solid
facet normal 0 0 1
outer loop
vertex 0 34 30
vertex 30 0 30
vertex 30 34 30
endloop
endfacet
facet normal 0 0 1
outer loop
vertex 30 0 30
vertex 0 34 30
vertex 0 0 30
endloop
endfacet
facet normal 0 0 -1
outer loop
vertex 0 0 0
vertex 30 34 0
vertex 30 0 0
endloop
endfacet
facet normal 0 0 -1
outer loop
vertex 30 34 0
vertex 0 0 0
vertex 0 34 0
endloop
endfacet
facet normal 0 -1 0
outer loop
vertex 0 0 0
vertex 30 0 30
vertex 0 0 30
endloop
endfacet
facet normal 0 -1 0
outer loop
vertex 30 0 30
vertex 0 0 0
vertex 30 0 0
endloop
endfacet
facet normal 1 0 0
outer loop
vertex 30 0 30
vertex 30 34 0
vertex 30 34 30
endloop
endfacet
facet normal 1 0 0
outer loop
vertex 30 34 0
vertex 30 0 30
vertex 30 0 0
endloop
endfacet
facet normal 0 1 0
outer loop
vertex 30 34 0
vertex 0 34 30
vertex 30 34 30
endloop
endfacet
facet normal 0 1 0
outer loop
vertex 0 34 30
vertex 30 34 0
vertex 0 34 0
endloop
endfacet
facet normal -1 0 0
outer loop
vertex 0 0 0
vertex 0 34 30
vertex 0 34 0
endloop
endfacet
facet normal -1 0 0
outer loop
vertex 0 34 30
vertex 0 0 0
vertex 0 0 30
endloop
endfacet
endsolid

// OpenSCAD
$fn = 64;

block_x = 30.0;
block_y = 34.0;
block_z = 30.0;

cube([block_x, block_y, block_z], center=false);
